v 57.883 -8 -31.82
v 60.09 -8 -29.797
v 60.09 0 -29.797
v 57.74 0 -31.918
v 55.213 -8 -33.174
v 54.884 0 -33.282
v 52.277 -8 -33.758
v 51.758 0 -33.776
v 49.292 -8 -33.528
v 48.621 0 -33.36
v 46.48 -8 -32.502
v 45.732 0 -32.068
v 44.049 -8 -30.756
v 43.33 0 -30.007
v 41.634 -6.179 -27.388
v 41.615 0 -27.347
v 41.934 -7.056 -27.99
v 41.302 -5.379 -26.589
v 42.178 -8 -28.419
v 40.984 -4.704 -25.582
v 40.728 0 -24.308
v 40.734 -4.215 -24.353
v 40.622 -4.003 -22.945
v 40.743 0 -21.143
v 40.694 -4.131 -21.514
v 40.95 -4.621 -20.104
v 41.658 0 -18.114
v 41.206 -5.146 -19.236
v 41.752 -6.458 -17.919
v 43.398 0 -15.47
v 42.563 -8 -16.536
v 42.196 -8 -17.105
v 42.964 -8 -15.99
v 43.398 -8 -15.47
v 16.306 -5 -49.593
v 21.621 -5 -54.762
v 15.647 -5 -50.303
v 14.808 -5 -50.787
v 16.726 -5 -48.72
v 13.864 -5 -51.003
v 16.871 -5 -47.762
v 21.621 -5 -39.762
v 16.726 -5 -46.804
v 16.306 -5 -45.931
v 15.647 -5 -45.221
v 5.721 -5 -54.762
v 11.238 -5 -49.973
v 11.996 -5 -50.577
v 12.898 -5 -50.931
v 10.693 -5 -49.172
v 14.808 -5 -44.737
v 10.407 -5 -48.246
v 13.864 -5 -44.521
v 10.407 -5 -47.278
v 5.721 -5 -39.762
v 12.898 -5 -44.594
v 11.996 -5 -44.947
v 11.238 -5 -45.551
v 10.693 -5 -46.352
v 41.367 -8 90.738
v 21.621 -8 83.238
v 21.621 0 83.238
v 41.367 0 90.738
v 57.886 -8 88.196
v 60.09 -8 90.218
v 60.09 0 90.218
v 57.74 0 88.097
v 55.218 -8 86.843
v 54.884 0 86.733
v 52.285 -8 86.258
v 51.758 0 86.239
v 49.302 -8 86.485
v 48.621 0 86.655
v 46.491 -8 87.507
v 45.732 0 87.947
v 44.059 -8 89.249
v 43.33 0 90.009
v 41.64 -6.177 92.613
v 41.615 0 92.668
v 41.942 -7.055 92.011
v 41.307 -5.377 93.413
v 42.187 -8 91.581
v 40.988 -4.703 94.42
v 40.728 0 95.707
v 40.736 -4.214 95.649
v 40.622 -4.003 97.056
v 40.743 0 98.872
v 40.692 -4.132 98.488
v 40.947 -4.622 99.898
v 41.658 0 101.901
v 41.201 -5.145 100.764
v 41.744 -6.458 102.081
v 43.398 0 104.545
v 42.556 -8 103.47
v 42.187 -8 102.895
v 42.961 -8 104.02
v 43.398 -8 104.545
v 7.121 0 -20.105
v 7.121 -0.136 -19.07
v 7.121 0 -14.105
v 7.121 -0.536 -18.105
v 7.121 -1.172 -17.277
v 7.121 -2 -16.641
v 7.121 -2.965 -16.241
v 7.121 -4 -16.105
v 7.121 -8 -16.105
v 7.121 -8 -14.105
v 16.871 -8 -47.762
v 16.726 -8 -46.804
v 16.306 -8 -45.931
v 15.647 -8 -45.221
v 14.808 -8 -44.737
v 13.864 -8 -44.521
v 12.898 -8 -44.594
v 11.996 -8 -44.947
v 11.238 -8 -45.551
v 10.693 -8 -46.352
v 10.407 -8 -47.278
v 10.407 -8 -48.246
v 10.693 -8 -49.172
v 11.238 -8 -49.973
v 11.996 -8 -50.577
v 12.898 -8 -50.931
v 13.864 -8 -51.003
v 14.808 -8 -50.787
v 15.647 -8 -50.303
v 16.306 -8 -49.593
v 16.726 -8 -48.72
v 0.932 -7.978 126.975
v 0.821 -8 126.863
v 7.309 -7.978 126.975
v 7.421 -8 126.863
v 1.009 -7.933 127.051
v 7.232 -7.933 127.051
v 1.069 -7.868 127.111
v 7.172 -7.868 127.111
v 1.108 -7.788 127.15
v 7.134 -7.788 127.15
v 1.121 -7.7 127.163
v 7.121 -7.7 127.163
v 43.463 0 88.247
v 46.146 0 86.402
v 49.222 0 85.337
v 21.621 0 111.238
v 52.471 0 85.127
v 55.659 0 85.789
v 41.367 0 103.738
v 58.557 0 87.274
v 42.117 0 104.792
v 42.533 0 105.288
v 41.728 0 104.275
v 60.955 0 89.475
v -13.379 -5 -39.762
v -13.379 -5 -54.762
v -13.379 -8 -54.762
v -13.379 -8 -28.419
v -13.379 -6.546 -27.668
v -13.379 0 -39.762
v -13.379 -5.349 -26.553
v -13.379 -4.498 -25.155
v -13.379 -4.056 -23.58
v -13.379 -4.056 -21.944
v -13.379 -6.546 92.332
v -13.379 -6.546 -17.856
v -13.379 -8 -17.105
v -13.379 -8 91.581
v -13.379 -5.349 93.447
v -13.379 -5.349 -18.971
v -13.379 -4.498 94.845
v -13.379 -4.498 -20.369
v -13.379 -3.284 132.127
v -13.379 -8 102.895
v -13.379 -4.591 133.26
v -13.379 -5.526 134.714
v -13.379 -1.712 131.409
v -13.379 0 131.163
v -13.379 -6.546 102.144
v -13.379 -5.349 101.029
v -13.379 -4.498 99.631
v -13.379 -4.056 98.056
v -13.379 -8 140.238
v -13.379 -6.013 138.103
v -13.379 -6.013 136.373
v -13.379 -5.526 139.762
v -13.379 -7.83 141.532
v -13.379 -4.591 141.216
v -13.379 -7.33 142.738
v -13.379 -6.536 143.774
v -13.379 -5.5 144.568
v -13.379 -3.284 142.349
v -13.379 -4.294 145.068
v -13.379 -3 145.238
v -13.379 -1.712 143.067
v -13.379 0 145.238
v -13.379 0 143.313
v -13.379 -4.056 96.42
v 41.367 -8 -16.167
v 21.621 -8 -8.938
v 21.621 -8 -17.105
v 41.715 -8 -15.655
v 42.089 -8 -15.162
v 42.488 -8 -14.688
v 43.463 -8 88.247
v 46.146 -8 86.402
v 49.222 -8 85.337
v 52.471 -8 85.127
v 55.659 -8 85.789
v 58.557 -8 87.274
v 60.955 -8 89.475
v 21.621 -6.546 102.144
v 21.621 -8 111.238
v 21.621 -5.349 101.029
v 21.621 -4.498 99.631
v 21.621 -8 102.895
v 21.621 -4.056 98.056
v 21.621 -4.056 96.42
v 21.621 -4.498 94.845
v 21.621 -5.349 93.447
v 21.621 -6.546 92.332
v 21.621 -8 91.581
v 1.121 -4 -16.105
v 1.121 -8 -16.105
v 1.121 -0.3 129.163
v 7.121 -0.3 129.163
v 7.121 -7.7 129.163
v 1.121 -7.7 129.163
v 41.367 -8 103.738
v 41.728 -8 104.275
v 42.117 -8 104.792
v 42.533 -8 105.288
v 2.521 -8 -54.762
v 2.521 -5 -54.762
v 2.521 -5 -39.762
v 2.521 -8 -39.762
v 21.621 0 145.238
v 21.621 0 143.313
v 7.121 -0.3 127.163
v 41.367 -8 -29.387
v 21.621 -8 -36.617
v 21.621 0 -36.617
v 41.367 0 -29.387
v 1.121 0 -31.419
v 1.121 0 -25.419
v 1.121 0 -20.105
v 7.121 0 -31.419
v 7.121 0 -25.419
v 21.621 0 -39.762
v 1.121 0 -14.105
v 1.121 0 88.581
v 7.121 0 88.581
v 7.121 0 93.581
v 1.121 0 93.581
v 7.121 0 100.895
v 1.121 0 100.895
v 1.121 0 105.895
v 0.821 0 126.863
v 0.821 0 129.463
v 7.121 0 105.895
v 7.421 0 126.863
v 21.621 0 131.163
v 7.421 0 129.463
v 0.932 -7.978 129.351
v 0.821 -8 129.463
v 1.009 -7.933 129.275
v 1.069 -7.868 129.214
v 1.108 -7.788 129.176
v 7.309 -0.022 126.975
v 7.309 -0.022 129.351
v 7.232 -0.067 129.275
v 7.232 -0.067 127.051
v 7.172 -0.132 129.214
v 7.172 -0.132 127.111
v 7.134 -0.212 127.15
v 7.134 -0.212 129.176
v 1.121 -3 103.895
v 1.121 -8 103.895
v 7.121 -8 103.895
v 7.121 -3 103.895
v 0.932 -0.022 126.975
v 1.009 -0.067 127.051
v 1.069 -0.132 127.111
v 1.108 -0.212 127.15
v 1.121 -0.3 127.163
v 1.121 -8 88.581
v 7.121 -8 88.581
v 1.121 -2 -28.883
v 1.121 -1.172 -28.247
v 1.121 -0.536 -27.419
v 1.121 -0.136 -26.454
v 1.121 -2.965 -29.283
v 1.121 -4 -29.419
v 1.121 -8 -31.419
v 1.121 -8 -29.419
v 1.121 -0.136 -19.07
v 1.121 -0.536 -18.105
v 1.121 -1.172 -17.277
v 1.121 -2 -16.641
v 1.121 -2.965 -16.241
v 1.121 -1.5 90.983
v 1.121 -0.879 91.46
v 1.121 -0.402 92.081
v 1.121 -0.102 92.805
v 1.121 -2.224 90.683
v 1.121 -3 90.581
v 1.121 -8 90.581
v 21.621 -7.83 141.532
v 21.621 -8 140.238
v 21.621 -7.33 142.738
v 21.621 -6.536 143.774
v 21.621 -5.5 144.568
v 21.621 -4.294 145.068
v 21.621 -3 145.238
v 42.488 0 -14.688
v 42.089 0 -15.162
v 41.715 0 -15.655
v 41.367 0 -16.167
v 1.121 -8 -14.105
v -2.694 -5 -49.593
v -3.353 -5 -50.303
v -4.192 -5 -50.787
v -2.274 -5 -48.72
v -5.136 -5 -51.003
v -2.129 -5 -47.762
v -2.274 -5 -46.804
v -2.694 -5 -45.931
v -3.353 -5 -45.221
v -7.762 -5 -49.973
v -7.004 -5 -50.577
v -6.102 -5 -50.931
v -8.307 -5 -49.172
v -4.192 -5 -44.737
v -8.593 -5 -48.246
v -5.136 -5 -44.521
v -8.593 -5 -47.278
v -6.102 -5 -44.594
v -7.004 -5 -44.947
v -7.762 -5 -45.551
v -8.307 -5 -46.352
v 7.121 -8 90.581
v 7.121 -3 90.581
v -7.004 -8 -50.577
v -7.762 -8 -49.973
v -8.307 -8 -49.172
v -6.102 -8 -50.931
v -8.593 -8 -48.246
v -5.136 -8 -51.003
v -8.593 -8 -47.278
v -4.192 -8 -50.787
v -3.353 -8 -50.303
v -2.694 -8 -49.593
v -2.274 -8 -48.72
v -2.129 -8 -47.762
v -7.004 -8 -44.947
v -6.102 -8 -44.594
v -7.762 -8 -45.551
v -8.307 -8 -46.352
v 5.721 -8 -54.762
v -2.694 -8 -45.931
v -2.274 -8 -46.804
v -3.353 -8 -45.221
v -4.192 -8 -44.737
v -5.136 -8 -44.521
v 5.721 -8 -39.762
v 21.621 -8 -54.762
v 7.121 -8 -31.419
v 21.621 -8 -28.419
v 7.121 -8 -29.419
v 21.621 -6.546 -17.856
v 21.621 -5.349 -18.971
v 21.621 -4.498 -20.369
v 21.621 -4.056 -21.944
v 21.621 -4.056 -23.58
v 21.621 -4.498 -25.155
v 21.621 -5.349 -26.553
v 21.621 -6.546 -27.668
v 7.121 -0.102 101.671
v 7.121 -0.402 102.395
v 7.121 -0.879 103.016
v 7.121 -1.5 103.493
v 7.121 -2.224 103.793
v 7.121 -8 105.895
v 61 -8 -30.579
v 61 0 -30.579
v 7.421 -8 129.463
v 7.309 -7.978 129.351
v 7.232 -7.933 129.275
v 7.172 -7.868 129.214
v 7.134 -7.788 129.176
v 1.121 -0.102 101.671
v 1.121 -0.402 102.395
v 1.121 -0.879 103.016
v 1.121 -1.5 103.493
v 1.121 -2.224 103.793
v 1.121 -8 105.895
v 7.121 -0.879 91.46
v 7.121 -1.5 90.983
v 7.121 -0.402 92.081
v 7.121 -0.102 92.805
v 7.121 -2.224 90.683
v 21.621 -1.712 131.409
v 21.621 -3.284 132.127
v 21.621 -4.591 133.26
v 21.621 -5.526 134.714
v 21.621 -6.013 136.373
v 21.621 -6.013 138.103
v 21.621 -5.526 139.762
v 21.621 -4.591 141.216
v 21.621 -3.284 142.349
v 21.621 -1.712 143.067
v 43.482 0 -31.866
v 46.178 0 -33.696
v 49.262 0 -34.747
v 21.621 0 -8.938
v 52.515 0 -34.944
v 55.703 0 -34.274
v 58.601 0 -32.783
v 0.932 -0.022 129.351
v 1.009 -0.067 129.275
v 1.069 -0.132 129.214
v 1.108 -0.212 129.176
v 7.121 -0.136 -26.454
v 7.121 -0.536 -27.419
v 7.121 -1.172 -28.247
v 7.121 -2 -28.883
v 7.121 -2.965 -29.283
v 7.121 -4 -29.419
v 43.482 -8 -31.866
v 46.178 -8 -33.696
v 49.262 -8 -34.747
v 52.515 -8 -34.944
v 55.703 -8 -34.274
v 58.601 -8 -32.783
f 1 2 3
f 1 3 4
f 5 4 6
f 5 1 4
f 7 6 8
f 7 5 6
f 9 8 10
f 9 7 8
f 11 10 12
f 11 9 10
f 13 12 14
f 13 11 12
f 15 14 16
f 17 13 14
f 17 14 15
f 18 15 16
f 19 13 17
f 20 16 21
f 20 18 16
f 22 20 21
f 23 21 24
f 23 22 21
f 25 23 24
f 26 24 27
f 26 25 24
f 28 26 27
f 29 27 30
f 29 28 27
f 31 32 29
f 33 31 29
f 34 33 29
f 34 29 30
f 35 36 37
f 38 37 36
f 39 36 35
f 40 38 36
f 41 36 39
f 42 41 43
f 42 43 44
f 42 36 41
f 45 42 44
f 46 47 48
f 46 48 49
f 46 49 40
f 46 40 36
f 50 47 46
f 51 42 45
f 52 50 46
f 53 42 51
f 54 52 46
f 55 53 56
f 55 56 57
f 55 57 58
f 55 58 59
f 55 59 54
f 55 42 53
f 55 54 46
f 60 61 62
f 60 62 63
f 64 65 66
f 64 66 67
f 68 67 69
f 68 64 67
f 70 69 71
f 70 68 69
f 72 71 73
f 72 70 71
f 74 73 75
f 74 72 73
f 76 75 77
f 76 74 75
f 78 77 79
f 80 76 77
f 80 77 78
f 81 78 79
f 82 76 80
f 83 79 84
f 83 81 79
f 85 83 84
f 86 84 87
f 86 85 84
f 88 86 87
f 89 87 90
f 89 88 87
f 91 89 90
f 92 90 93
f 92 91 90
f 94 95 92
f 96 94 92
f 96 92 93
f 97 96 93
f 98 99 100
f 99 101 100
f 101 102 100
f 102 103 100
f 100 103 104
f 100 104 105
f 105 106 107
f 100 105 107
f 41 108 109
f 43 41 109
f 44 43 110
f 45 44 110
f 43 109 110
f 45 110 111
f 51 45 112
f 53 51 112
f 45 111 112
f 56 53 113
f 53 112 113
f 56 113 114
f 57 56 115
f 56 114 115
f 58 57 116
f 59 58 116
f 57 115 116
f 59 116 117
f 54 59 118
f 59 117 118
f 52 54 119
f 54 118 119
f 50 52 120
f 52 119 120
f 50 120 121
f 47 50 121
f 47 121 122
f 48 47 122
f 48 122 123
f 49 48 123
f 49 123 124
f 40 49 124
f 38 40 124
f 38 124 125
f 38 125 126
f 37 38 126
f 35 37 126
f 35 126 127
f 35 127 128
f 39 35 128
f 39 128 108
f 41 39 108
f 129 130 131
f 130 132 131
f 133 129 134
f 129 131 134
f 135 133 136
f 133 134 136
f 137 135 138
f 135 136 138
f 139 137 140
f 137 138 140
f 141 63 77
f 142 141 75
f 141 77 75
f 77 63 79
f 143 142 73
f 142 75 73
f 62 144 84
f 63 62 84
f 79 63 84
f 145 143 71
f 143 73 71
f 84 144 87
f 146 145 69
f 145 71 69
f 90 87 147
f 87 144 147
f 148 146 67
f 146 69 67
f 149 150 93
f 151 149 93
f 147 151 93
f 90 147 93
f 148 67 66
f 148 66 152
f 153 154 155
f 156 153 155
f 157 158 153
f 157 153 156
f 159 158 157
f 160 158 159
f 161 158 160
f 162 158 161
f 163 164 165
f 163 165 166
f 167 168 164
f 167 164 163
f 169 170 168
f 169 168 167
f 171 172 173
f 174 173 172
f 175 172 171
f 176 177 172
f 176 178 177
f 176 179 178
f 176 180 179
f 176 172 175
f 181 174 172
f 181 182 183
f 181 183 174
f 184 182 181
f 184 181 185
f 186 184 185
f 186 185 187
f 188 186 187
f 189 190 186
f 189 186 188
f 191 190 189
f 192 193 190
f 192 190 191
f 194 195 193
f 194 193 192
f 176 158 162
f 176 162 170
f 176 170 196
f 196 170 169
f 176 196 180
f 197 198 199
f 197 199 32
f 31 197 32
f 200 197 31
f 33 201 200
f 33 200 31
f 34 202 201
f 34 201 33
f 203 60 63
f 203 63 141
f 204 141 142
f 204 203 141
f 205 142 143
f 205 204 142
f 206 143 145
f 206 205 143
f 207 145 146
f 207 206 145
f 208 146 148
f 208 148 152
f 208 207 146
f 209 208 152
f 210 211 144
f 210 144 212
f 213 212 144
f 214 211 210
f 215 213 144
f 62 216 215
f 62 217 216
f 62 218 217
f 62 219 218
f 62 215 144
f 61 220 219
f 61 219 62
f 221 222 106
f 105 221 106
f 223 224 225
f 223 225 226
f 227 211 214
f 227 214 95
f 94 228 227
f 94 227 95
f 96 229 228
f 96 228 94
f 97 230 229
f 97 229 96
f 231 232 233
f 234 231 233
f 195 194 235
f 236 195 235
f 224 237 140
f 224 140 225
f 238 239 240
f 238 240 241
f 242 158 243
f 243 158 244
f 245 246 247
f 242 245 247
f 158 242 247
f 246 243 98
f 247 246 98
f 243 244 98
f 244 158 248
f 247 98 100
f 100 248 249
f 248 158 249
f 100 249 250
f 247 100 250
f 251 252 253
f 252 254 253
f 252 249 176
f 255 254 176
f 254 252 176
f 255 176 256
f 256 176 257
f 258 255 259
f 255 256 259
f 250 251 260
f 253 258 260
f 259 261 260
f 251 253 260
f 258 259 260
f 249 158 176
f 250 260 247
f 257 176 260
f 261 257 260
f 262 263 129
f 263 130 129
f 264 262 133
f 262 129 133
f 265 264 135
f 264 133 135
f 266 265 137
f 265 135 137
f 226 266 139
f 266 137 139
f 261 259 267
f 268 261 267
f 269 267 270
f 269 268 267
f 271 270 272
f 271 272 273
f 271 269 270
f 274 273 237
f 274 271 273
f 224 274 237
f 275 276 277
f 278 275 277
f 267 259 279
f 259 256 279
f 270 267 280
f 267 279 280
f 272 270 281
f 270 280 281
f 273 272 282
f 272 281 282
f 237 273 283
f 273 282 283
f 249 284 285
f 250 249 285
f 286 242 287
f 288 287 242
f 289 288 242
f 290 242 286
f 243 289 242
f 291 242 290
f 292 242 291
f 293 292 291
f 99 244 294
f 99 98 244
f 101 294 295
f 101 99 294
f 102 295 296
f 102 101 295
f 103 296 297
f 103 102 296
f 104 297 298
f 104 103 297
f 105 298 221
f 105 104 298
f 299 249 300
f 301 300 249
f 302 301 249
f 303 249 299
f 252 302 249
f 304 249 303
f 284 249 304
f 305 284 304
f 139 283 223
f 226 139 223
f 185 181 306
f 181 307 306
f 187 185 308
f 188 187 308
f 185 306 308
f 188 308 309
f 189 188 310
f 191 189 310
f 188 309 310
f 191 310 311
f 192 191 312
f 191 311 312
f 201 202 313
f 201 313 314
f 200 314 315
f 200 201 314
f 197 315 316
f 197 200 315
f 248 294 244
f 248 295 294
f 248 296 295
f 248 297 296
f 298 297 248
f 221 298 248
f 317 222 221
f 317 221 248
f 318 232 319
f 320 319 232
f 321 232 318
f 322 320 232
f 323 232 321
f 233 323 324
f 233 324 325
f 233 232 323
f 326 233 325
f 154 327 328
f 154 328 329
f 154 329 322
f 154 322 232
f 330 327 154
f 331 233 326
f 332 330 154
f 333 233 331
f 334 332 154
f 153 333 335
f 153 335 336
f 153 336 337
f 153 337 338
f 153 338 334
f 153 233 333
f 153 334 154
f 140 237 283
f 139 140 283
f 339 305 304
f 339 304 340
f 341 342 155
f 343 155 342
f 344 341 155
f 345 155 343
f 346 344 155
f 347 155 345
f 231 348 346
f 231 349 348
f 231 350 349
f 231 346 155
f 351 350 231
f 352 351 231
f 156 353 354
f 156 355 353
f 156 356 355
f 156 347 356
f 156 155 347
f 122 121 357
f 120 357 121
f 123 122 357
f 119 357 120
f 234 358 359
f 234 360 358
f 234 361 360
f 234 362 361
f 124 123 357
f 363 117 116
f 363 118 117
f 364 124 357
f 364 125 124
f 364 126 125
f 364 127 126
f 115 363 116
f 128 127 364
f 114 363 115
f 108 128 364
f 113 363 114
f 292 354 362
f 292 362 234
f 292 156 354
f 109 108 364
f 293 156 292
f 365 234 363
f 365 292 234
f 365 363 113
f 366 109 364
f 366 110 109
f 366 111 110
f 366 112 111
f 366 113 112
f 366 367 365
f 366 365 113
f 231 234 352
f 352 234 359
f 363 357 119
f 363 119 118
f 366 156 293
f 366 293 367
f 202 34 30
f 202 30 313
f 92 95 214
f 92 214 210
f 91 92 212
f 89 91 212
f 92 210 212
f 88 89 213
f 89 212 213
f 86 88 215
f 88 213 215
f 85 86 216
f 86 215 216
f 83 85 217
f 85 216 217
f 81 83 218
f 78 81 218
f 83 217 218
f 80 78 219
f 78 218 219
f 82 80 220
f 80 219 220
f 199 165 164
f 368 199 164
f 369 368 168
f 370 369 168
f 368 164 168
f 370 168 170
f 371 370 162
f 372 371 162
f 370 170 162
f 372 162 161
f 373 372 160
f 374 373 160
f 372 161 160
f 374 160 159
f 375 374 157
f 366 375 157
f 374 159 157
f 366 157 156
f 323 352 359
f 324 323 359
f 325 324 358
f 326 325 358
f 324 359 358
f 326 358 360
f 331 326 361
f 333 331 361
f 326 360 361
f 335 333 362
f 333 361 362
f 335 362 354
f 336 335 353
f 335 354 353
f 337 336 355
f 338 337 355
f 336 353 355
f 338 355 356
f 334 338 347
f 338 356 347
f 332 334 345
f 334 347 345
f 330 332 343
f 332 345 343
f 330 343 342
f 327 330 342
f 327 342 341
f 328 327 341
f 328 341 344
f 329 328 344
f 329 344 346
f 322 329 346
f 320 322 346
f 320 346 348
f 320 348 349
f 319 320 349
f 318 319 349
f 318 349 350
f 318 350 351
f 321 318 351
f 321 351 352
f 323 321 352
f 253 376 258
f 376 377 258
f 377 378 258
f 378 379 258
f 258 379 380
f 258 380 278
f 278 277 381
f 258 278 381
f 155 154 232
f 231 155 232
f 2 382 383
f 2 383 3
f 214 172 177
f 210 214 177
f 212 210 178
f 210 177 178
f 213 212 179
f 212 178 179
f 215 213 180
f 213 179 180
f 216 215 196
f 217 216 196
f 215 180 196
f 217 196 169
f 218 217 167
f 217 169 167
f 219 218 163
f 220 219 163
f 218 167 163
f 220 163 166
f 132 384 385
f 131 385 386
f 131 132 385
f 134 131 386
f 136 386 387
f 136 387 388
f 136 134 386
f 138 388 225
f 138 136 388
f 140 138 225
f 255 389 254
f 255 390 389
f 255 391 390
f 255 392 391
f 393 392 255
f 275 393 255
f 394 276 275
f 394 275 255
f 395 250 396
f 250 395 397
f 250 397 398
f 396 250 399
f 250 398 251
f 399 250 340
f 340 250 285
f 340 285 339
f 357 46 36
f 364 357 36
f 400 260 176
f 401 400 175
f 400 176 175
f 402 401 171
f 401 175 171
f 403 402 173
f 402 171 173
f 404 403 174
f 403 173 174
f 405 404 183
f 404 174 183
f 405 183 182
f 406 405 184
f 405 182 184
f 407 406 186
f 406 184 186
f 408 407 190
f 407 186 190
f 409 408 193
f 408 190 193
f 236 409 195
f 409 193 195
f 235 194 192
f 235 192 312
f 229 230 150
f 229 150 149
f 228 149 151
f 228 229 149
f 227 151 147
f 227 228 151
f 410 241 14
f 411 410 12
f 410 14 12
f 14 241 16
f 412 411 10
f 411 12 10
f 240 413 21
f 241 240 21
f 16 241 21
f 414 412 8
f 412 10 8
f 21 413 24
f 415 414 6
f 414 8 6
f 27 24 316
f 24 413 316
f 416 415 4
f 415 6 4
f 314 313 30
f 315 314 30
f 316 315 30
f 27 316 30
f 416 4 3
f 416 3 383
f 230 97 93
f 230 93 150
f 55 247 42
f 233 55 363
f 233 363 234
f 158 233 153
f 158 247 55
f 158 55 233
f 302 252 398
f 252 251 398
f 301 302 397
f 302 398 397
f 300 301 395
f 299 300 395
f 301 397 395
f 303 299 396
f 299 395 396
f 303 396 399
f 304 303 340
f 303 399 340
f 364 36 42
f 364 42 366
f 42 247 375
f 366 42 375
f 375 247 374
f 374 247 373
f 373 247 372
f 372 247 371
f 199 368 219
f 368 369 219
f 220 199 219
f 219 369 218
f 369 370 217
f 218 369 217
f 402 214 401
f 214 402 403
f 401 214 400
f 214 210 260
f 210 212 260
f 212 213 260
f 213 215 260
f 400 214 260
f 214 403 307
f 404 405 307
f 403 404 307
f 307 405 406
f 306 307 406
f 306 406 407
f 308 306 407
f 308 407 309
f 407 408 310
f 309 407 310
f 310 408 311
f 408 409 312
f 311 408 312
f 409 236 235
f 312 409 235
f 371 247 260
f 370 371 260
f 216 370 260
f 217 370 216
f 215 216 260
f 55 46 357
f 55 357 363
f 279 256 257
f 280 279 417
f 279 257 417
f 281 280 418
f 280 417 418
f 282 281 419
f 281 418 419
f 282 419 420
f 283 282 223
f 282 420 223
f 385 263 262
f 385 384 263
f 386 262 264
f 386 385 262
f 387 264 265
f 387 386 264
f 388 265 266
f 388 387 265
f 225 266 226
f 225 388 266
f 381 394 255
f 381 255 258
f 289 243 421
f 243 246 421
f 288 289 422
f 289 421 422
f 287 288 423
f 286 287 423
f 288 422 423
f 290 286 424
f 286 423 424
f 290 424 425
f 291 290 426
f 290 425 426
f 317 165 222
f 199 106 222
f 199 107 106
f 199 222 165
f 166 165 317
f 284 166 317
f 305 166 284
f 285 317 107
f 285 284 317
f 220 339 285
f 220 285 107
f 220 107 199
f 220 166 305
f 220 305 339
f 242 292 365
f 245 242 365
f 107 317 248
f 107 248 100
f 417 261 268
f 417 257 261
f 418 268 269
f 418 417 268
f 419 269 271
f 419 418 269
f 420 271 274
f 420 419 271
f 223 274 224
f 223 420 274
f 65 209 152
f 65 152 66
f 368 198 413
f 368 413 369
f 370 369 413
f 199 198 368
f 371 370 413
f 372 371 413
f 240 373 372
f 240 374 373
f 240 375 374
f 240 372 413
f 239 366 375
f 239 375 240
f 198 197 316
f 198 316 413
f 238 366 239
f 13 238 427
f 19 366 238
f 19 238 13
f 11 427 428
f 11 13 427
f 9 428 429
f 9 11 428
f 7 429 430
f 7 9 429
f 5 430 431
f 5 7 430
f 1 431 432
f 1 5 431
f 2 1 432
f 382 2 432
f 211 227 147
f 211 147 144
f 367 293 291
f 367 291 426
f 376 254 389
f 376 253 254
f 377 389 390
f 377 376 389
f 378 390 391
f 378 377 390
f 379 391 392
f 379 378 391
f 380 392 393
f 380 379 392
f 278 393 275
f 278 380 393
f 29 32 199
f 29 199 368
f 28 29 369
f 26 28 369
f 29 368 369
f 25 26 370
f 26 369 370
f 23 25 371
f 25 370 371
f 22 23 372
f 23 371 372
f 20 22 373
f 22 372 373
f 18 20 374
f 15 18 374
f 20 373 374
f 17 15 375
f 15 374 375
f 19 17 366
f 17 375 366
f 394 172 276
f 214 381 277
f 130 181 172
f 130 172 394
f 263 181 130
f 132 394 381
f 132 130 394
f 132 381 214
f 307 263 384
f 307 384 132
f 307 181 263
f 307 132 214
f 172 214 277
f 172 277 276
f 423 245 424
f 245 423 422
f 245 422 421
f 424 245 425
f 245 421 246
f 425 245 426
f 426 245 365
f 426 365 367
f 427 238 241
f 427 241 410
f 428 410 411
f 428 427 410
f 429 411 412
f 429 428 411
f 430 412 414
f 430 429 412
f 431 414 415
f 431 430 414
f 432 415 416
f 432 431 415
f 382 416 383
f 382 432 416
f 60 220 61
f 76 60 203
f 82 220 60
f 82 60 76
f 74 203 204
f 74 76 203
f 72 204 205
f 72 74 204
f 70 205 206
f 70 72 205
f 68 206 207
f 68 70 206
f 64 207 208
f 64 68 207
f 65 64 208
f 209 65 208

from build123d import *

# Parameters (mm, degrees)
F0_W      = 35
F0_H      = 200
F1_DEPTH  = 8
F2_R      = 6.075
F3_DEPTH  = 45
F4_W      = 6
F4_H      = 2
F6_DEPTH  = 25
F7_R      = 0.3
F8_R      = 3.25
F9_DEPTH  = 25
F10_W     = 35
F10_H     = 15
F10_R     = 3.25
F11_DEPTH = 5
F12_W     = 3.2
F12_H     = 15
F13_DEPTH = 5
F15_DEPTH = 8
F17_DEPTH = 60
F18_W     = 6
F18_H     = 2
F19_DEPTH = 25
F20_R     = 3
F22_DEPTH = 8
F24_DEPTH = 60
F25_W     = 6
F25_H     = 2
F26_DEPTH = 25
F27_R     = 4
F28_R     = 5


with BuildPart() as f1:
    # F0 (on Front) → F1 (new body)
    with BuildSketch(Plane.XZ):
        with Locations((4.1207429767, 45.2379755676)):
            Rectangle(F0_W, F0_H)
    extrude(amount=F1_DEPTH)

    # F2 (on face) → F3 (cut)
    with BuildSketch(Plane(origin=(-13.3792570233, 0, 0), x_dir=(0, -1, 0), z_dir=(-1, 0, 0))):
        with Locations((0, 137.2379755676)):
            Circle(F2_R)
    extrude(amount=-F3_DEPTH, mode=Mode.SUBTRACT)

    # F4 (on face) → F6 (cut)
    with BuildSketch(Plane(origin=(0, 0, 0), x_dir=(-1, 0, 0), z_dir=(0, 1, 0))):
        with Locations((-4.1207429767, 128.1629755676)):
            Rectangle(F4_W, F4_H)
    extrude(amount=-F6_DEPTH, mode=Mode.SUBTRACT)

    # F7
    f7_edges = [f1.edges().sort_by_distance(p)[0] for p in [
        (4.120743, -8, 129.162976),
        (4.120743, -8, 127.162976),
        (7.120743, -8, 128.162976),
        (1.120743, -8, 128.162976),
        (4.120743, 0, 129.162976),
        (7.120743, 0, 128.162976),
        (4.120743, 0, 127.162976),
        (1.120743, 0, 128.162976),
    ]]
    fillet(f7_edges, radius=F7_R)

    # F8 (on face) → F9 (cut)
    with BuildSketch(Plane.XZ.offset(8)):
        with Locations((-5.3792570233, -47.7620244324)):
            Circle(F8_R)
        with Locations((13.6207429767, -47.7620244324)):
            Circle(F8_R)
    extrude(amount=-F9_DEPTH, mode=Mode.SUBTRACT)

    # F10 (on face) → F11 (cut)
    with BuildSketch(Plane(origin=(0, 0, 0), x_dir=(-1, 0, 0), z_dir=(0, 1, 0))):
        with Locations((-4.1207429767, -47.2620244324)):
            Rectangle(F10_W, F10_H)
        with Locations((-13.6207429767, -47.7620244324)):
            Circle(F10_R, mode=Mode.SUBTRACT)
        with Locations((5.3792570233, -47.7620244324)):
            Circle(F10_R, mode=Mode.SUBTRACT)
    extrude(amount=-F11_DEPTH, mode=Mode.SUBTRACT)

    # F12 (on face) → F13 (cut)
    with BuildSketch(Plane(origin=(0, -5, 0), x_dir=(-1, 0, 0), z_dir=(0, 1, 0))):
        with Locations((-4.1207429767, -47.2620244324)):
            Rectangle(F12_W, F12_H)
    extrude(amount=-F13_DEPTH, mode=Mode.SUBTRACT)


with BuildPart() as f15:
    # F14 (on face) → F15 (new body)
    with BuildSketch(Plane.XZ.offset(8)):
        with BuildLine():
            Line((43.3983385859, 104.5449630477), (42.5326327836, 105.2880271371))
            ThreePointArc((42.5326327836, 105.2880271371), (41.9186205584, 104.5363245407), (41.3666180919, 103.7379755676))
            Line((41.3666180919, 103.7379755676), (21.6207429767, 111.2379755676))
            Line((21.6207429767, 111.2379755676), (21.6207429767, 83.2379755676))
            Line((21.6207429767, 83.2379755676), (41.3666180919, 90.7379755676))
            ThreePointArc((41.3666180919, 90.7379755676), (50.8396956104, 85.1224053307), (60.9553951185, 89.4751573587))
            Line((60.9553951185, 89.4751573587), (60.0896893162, 90.2182214481))
            ThreePointArc((60.0896893162, 90.2182214481), (44.4563116002, 88.891064579), (43.3983385859, 104.5449630477))
        make_face()
    extrude(amount=-F15_DEPTH)


with BuildPart() as f17_tool:
    # F16 (on face) → F17 (new body)
    with BuildSketch(Plane(origin=(-13.3792570233, 0, 0), x_dir=(0, -1, 0), z_dir=(-1, 0, 0))):
        with BuildLine():
            Line((8, 91.5811213181), (8, 102.8948298171))
            ThreePointArc((8, 102.8948298171), (4, 97.2379755676), (8, 91.5811213181))
        make_face()
    extrude(amount=-F17_DEPTH)


with BuildPart() as f1_1:
    add(f1.part)

    # F17: cut by f17_tool
    add(f17_tool.part, mode=Mode.SUBTRACT)

    # F18 (on face) → F19 (cut)
    with BuildSketch(Plane.XZ.offset(8)):
        with Locations((4.1207429767, 104.8948298171)):
            Rectangle(F18_W, F18_H)
        with Locations((4.1207429767, 89.5811213181)):
            Rectangle(F18_W, F18_H)
    extrude(amount=-F19_DEPTH, mode=Mode.SUBTRACT)

    # F20
    f20_edges = [f1_1.edges().sort_by_distance(p)[0] for p in [
        (4.120743, 0, 103.89483),
        (4.120743, 0, 90.581121),
    ]]
    fillet(f20_edges, radius=F20_R)


with BuildPart() as f15_1:
    add(f15.part)

    # F17: cut by f17_tool
    add(f17_tool.part, mode=Mode.SUBTRACT)


with BuildPart() as f22:
    # F21 (on face) → F22 (new body)
    with BuildSketch(Plane.XZ.offset(8)):
        with BuildLine():
            Line((43.3983385859, -15.4701377146), (42.4876449259, -14.6884590503))
            ThreePointArc((42.4876449259, -14.6884590503), (41.8989802423, -15.4064176752), (41.3666180919, -16.1670629524))
            Line((41.3666180919, -16.1670629524), (21.6207429767, -8.937722072))
            Line((21.6207429767, -8.937722072), (21.6207429767, -36.6165283173))
            Line((21.6207429767, -36.6165283173), (41.3666180919, -29.387187437))
            ThreePointArc((41.3666180919, -29.387187437), (50.8818100329, -34.9547266869), (61.0003829762, -30.5785579784))
            Line((61.0003829762, -30.5785579784), (60.0896893162, -29.7968793141))
            ThreePointArc((60.0896893162, -29.7968793141), (44.4563116002, -31.1240361833), (43.3983385859, -15.4701377146))
        make_face()
    extrude(amount=-F22_DEPTH)


with BuildPart() as f24_tool:
    # F23 (on face) → F24 (new body)
    with BuildSketch(Plane(origin=(-13.3792570233, 0, 0), x_dir=(0, -1, 0), z_dir=(-1, 0, 0))):
        with BuildLine():
            Line((8, -28.4188786819), (8, -17.1051701829))
            ThreePointArc((8, -17.1051701829), (4, -22.7620244324), (8, -28.4188786819))
        make_face()
    extrude(amount=-F24_DEPTH)


with BuildPart() as f1_2:
    add(f1_1.part)

    # F24: cut by f24_tool
    add(f24_tool.part, mode=Mode.SUBTRACT)

    # F25 (on face) → F26 (cut)
    with BuildSketch(Plane.XZ.offset(8)):
        with Locations((4.1207429767, -15.1051701829)):
            Rectangle(F25_W, F25_H)
        with Locations((4.1207429767, -30.4188786819)):
            Rectangle(F25_W, F25_H)
    extrude(amount=-F26_DEPTH, mode=Mode.SUBTRACT)

    # F27
    f27_edges = [f1_2.edges().sort_by_distance(p)[0] for p in [
        (4.120743, 0, -16.10517),
        (4.120743, 0, -29.418879),
    ]]
    fillet(f27_edges, radius=F27_R)

    # F28
    f28_edges = [f1_2.edges().sort_by_distance(p)[0] for p in [
        (4.120743, -8, 145.237976),
    ]]
    fillet(f28_edges, radius=F28_R)


with BuildPart() as f22_1:
    add(f22.part)

    # F24: cut by f24_tool
    add(f24_tool.part, mode=Mode.SUBTRACT)


solid = Compound([f15_1.part, f1_2.part, f22_1.part])
